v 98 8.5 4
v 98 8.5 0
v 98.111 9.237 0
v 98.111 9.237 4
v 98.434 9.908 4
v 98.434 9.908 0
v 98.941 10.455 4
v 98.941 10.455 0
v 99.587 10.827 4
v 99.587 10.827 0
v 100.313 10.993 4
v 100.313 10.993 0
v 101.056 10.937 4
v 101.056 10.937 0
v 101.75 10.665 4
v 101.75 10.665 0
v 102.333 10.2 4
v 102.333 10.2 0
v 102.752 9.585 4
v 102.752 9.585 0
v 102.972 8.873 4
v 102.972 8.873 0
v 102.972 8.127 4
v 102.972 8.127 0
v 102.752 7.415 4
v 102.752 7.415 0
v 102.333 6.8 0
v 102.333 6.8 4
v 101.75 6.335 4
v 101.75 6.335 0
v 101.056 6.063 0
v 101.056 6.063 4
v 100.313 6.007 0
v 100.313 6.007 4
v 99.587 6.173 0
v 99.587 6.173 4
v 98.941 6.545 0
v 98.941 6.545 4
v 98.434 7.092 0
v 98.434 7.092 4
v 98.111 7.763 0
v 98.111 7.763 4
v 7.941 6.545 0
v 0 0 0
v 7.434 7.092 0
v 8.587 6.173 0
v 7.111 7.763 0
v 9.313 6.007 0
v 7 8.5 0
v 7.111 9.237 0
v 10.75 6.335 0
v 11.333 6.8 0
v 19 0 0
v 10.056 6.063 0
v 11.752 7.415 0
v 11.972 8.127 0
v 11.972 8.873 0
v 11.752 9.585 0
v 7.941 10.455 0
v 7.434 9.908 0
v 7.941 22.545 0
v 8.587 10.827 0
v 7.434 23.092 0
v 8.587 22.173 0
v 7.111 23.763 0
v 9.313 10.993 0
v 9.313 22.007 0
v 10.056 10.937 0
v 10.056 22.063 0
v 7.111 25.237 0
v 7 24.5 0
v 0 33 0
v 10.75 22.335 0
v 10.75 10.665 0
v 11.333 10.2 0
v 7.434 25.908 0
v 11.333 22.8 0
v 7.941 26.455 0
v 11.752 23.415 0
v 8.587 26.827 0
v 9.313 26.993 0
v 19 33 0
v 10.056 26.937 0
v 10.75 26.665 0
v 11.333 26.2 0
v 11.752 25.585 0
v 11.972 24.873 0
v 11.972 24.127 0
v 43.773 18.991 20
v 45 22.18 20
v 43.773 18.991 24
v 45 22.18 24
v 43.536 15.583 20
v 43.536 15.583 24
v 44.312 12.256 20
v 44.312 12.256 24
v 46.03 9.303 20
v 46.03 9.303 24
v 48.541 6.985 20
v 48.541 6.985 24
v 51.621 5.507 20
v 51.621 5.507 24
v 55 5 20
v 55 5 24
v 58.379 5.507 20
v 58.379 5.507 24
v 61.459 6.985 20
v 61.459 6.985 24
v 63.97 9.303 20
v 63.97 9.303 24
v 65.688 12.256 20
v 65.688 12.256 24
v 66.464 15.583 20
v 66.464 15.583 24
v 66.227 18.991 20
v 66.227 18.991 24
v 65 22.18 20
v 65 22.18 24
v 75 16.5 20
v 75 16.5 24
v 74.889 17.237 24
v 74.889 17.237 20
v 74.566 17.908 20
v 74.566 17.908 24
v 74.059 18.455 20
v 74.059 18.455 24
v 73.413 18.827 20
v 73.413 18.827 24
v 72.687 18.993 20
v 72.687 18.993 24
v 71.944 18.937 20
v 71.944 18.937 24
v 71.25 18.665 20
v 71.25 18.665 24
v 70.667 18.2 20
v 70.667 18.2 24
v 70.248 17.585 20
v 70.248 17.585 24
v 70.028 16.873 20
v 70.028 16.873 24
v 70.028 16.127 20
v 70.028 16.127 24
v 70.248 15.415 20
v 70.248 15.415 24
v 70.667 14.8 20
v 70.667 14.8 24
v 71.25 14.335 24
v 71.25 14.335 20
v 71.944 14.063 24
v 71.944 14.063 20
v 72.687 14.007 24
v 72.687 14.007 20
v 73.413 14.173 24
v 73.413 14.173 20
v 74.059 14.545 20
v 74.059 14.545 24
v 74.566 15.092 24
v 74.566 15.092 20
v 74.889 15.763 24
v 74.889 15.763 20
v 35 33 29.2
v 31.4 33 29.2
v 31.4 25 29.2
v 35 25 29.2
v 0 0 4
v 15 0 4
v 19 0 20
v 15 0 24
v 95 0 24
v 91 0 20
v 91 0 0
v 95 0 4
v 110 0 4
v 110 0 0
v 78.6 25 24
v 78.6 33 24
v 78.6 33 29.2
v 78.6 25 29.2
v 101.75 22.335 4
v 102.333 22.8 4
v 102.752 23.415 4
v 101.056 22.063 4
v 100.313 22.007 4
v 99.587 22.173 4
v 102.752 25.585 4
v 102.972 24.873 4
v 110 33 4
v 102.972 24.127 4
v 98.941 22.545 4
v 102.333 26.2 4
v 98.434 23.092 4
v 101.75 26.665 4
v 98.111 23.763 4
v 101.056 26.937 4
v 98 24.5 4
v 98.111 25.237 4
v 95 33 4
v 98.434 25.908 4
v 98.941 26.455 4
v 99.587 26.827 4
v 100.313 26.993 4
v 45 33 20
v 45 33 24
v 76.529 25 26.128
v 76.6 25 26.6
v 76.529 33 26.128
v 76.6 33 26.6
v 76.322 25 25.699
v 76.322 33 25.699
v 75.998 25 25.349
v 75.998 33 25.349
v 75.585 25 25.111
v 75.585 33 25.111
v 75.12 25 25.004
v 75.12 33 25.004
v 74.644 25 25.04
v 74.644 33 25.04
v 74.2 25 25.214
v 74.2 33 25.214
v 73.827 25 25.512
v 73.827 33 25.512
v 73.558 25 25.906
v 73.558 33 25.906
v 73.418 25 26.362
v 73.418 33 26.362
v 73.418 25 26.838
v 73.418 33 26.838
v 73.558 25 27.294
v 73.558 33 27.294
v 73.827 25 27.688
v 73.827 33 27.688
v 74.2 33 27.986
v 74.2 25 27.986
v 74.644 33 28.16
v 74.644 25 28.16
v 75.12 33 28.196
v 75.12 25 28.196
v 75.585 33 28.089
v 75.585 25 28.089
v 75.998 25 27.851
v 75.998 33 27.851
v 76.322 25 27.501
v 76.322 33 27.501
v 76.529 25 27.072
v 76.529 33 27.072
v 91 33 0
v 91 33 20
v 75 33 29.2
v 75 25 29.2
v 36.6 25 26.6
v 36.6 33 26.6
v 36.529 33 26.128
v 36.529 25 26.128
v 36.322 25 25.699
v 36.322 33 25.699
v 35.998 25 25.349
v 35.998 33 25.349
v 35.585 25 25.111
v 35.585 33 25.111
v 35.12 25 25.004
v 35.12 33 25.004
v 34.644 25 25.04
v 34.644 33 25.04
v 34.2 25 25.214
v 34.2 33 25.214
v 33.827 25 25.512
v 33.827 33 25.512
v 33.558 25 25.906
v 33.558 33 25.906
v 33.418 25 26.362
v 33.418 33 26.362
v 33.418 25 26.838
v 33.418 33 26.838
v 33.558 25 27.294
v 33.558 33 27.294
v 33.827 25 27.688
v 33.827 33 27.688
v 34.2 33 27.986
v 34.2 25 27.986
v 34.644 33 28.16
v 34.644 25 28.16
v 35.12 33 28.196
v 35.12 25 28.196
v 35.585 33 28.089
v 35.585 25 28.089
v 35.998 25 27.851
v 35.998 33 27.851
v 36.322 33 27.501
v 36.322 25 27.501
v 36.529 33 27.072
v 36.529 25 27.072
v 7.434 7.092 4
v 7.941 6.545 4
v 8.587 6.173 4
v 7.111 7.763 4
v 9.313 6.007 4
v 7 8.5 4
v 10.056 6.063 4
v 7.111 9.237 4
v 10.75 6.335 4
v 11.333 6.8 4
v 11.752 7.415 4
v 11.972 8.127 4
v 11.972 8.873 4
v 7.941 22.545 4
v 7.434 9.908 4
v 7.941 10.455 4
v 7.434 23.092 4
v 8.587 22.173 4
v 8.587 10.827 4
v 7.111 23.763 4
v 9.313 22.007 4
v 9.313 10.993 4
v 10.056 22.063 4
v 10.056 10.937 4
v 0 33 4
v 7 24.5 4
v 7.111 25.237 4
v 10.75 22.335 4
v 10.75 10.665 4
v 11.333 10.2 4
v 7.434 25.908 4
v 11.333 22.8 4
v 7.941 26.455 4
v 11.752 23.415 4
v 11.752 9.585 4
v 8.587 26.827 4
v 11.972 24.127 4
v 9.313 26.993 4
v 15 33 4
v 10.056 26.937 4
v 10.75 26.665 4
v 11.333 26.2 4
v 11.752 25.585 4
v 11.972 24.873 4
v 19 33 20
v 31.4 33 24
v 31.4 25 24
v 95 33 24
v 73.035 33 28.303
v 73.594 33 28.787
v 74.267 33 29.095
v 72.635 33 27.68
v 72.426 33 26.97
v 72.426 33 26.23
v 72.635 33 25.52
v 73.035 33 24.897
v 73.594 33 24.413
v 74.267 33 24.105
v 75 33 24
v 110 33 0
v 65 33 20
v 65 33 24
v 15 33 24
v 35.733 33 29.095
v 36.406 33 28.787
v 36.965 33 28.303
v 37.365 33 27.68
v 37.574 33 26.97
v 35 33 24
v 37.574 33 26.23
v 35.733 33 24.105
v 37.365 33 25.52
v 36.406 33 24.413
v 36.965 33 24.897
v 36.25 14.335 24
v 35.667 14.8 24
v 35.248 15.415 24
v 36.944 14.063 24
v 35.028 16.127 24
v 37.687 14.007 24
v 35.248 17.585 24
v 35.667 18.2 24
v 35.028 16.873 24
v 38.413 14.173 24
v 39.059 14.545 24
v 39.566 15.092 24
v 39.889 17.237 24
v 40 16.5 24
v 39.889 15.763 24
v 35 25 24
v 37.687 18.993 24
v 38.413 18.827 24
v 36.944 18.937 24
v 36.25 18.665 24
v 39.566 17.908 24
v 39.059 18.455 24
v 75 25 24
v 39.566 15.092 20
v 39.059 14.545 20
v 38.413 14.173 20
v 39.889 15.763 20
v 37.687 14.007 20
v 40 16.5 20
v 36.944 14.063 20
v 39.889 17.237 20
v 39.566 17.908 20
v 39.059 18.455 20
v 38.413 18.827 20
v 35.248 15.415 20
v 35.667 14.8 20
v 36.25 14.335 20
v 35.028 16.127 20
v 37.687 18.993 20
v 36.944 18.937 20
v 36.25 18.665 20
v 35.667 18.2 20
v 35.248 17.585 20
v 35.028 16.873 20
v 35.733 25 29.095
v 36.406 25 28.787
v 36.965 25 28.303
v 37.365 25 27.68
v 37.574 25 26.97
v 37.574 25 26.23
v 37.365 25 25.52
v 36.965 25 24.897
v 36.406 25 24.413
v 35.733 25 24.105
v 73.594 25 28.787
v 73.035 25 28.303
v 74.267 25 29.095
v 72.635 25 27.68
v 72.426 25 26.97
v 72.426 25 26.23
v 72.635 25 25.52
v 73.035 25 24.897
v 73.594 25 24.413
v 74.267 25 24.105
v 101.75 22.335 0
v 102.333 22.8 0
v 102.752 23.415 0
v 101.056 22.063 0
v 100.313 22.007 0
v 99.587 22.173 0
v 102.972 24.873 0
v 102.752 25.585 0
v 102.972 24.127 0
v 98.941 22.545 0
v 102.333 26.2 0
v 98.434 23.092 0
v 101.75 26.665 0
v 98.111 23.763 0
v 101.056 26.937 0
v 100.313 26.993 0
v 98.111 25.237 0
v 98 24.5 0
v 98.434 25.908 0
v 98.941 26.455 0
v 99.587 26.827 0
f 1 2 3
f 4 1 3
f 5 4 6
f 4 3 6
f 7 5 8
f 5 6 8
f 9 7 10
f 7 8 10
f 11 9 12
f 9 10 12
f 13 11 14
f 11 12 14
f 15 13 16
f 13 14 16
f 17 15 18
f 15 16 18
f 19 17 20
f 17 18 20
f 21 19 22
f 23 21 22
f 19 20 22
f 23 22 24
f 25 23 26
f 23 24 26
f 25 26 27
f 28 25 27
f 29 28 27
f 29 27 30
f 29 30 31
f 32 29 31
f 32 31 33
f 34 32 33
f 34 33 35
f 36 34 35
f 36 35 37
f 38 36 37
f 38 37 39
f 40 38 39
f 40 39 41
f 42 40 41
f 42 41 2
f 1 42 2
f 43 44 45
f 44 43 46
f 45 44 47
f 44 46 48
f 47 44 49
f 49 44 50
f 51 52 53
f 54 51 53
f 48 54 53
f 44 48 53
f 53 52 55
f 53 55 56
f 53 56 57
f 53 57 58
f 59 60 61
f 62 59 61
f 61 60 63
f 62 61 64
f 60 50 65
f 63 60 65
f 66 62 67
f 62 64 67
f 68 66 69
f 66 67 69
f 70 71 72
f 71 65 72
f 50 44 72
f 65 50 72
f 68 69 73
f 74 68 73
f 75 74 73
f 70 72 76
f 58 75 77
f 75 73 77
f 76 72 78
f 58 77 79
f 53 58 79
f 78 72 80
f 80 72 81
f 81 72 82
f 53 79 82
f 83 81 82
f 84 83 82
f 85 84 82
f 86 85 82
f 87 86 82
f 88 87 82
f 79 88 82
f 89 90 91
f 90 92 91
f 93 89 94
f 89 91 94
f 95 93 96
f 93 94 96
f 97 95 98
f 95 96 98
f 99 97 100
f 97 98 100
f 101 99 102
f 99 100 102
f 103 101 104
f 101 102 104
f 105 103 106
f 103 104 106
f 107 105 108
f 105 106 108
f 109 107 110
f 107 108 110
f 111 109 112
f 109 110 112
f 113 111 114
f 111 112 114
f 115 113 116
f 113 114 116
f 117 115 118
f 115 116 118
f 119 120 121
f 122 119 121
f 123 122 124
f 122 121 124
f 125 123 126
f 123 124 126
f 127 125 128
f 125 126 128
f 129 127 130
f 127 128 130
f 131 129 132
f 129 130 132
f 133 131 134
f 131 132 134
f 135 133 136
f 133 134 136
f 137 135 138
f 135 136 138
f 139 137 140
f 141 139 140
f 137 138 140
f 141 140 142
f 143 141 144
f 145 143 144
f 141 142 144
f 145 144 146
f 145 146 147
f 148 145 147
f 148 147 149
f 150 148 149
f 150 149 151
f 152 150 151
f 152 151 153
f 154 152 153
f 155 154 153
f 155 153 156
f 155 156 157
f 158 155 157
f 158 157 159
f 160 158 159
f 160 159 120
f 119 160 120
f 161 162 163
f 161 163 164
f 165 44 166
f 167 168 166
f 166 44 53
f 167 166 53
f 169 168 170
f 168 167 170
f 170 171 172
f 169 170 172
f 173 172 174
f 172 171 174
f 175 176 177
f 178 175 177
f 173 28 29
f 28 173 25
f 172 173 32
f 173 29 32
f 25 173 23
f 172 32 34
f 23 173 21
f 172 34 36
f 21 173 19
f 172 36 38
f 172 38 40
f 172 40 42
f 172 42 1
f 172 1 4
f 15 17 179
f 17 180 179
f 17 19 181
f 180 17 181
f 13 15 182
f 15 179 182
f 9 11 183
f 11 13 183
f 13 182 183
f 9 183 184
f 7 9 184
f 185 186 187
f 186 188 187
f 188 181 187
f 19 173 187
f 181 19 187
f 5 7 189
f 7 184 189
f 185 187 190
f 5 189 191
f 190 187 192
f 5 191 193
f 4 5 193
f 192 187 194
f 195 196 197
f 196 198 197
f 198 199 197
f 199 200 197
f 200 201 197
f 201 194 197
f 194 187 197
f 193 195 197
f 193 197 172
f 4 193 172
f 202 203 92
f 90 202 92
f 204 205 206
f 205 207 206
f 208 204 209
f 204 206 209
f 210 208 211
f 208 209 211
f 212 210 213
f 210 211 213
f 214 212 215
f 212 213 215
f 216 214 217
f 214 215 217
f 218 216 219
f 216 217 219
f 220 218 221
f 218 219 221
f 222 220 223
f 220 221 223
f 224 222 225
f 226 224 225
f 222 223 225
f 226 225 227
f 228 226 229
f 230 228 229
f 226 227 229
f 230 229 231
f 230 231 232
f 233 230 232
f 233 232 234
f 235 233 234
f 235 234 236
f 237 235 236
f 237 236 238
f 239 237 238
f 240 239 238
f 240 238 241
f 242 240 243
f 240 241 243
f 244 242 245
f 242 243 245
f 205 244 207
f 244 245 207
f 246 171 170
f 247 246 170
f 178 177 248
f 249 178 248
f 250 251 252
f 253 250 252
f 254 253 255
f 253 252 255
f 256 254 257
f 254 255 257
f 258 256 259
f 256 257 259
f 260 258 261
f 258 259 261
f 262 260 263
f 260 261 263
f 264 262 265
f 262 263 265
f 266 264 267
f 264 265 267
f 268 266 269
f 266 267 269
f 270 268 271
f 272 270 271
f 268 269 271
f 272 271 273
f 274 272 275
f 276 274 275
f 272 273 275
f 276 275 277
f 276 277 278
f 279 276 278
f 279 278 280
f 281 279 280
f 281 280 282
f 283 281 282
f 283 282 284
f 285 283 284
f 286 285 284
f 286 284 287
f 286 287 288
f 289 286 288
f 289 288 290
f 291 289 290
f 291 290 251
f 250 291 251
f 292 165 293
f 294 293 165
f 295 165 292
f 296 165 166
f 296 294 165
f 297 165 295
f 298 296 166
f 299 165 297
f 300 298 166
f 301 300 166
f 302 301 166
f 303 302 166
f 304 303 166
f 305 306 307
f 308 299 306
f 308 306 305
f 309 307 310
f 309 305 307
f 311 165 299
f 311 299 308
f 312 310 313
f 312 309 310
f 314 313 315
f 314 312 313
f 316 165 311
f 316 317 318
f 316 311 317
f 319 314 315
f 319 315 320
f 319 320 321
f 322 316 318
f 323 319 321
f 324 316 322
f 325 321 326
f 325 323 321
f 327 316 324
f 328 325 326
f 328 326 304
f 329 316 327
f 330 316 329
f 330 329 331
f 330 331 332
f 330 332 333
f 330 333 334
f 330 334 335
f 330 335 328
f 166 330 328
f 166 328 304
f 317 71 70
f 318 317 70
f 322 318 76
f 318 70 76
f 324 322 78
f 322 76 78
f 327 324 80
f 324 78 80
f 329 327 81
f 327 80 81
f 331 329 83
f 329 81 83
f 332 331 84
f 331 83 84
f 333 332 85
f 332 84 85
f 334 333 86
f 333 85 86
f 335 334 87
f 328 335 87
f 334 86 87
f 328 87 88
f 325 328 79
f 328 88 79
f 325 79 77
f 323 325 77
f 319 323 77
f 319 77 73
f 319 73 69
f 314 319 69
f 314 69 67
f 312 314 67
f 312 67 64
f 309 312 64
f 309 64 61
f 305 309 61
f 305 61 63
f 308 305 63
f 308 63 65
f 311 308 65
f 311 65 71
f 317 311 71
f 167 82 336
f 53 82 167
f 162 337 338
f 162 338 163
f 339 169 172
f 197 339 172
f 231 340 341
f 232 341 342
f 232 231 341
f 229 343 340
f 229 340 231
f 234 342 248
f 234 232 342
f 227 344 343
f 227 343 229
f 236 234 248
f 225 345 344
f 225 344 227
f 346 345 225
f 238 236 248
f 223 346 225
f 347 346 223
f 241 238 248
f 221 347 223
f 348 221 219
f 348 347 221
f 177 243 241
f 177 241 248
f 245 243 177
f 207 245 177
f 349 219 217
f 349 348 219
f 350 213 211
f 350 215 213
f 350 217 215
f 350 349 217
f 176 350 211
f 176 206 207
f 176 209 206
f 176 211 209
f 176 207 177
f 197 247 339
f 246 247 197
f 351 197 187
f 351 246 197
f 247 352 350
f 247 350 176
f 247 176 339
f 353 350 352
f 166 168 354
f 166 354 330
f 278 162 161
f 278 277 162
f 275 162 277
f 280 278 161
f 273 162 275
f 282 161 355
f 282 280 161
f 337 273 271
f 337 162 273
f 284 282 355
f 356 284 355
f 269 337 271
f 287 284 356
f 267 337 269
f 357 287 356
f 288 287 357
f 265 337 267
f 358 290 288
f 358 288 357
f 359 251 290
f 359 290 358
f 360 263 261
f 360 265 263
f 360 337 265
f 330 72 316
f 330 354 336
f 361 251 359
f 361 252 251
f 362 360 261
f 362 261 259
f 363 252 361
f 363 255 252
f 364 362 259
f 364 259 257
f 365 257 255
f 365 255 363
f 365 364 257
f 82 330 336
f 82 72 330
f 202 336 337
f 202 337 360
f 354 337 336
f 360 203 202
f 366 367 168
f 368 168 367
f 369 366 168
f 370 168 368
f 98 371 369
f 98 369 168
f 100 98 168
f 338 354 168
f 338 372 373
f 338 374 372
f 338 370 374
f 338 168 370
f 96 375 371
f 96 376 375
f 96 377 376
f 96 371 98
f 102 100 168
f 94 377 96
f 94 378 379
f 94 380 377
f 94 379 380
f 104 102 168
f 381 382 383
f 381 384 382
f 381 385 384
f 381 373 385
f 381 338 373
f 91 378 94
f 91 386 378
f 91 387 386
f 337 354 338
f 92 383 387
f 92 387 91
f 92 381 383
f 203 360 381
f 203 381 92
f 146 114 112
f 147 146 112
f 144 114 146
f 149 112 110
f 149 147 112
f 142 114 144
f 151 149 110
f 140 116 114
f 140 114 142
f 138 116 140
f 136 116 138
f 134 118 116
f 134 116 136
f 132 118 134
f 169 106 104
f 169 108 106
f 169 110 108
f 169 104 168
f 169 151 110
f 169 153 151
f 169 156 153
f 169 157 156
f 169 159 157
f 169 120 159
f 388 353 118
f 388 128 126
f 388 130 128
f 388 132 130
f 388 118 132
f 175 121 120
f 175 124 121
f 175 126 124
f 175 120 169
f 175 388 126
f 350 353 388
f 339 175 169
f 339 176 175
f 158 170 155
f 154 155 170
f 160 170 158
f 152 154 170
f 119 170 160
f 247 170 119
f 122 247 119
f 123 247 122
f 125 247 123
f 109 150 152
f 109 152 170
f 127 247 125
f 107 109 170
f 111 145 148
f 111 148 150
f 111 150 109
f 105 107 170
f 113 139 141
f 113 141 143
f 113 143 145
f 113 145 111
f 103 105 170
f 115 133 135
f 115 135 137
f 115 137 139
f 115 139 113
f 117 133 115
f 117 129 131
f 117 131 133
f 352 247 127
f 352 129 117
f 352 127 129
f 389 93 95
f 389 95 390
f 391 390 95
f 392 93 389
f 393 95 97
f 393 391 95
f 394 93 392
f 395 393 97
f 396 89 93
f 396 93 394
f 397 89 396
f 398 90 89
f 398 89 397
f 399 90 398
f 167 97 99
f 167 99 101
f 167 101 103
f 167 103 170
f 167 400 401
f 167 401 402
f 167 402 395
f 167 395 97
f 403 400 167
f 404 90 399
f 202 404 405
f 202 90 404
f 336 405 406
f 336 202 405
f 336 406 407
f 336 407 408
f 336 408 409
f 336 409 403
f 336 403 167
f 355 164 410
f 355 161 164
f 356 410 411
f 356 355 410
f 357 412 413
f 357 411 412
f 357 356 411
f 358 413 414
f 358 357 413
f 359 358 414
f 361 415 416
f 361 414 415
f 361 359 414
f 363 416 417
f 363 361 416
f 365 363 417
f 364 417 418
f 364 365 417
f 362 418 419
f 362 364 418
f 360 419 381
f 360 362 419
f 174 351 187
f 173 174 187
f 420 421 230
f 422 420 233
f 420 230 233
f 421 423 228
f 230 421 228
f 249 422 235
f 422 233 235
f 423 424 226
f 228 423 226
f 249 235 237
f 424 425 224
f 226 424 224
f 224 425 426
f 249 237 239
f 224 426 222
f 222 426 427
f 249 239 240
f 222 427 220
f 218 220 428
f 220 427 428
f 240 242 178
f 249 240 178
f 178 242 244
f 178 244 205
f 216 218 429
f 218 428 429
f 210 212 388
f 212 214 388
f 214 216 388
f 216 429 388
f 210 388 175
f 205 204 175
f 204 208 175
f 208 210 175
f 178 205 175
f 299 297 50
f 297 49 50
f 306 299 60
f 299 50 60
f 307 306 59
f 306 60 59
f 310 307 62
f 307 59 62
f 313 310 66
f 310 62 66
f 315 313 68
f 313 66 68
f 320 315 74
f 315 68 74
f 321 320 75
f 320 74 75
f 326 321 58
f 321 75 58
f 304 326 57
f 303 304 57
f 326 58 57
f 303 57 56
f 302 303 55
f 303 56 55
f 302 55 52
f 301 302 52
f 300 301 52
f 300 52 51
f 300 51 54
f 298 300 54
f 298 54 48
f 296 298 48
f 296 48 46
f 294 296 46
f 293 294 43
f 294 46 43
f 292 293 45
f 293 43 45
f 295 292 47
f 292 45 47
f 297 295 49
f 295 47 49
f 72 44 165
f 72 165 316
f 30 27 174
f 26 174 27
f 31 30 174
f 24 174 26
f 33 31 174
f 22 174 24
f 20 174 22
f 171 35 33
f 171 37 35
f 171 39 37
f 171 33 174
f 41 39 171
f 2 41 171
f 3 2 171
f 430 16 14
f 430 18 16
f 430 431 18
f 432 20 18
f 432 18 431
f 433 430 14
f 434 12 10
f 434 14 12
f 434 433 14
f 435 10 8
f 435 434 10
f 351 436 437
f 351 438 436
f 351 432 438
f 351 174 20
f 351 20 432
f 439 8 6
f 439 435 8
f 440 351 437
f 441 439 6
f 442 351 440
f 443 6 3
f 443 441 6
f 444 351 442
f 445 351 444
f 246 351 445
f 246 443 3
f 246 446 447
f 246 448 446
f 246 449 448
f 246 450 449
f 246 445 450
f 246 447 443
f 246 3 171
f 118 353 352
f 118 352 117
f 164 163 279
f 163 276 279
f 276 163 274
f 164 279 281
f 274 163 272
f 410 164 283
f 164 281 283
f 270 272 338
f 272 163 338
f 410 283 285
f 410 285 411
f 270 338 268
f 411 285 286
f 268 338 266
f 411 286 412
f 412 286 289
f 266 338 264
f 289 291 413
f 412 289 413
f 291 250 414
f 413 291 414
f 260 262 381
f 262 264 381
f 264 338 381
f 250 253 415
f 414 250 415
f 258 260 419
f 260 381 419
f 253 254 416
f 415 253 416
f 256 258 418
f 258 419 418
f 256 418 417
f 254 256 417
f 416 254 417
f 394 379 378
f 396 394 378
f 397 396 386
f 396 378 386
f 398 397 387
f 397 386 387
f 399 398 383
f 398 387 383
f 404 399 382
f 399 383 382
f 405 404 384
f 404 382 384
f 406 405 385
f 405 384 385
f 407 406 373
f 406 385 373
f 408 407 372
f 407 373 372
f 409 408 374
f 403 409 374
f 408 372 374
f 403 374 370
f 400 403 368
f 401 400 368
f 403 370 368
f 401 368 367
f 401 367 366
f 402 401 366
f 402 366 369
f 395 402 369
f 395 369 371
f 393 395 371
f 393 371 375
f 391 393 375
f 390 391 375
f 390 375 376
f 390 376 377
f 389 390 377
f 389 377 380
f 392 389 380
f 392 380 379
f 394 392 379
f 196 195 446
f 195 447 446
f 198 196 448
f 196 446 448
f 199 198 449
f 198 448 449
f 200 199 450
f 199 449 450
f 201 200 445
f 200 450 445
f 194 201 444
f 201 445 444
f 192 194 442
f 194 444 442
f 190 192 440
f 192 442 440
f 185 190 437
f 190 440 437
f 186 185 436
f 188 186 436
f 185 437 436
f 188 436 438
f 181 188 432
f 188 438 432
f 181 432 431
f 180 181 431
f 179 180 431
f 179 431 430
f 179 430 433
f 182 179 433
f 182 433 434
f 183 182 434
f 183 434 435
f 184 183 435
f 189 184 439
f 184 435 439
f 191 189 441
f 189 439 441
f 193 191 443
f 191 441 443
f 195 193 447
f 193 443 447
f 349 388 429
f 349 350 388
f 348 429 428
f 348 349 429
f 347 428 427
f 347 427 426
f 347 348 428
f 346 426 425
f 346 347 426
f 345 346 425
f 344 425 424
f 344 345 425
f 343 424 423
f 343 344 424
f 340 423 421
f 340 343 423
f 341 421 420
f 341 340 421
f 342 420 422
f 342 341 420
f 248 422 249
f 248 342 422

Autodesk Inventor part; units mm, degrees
ref_plane "YZ Plane" through (0, 0, 0) normal (1, 0, 0) x (0, 1, 0)
ref_plane "XZ Plane" through (0, 0, 0) normal (0, 1, 0) x (-1, 0, 0)
ref_plane "XY Plane" through (0, 0, 0) normal (0, 0, 1) x (1, 0, 0)
sketch "Sketch1" plane through (0, 0, 0) normal (0, 0, 1) x (1, 0, 0)
  line L0 (0, 0) -> (0, 33)
  line L1 (0, 33) -> (19, 33)
  line L2 (19, 33) -> (19, 0)
  line L3 (19, 0) -> (0, 0)
  dimension "d0" = 33
  dimension "d1" = 19
extrude "Extrusion1" add sketch "Sketch1" along normal blind 4
sketch "Sketch2" plane through (0, 33, 0) normal (0, 1, 0) x (1, 0, 0)
  line L0 (19, 0) -> (0, 0) projected
  line L1 (19, 0) -> (19, -24)
  line L2 (19, -24) -> (15, -24)
  line L3 (15, -24) -> (15, 0)
  line L4 (15, 0) -> (19, 0)
  dimension "d4" = 24
  dimension "d5" = 4
  dimension "d6" = 24
extrude "Extrusion2" add sketch "Sketch2" against normal blind 33
sketch "Sketch3" plane through (0, 33, 0) normal (0, 1, 0) x (1, 0, 0)
  line L0 (15, -4) -> (15, -24) projected
  line L1 (15, -24) -> (95, -24)
  line L2 (95, -24) -> (95, -20)
  line L3 (95, -20) -> (15, -20)
  line L4 (15, -20) -> (15, -24)
  point P0 (0, 0)
  dimension "d9" = 80
  dimension "d10" = 4
  dimension "d11" = 80
extrude "Extrusion3" add sketch "Sketch3" against normal blind 33
sketch "Sketch4" plane through (0, 33, 0) normal (0, 1, 0) x (1, 0, 0)
  line L0 (15, -24) -> (95, -24) projected
  line L1 (95, -24) -> (95, 0)
  line L2 (95, 0) -> (91, 0)
  line L3 (91, 0) -> (91, -24)
  line L4 (91, -24) -> (95, -24)
  point P0 (0, 0)
  dimension "d14" = 24
  dimension "d15" = 4
  dimension "d16" = 24
extrude "Extrusion4" add sketch "Sketch4" against normal blind 33
sketch "Sketch5" plane through (0, 33, 0) normal (0, 1, 0) x (1, 0, 0)
  line L0 (91, 0) -> (91, -20) projected
  line L1 (91, 0) -> (110, 0)
  line L2 (110, 0) -> (110, -4)
  line L3 (110, -4) -> (91, -4)
  line L4 (91, -4) -> (91, 0)
  point P0 (0, 0)
  dimension "d19" = 19
  dimension "d20" = 4
  dimension "d21" = 19
  dimension "d22" = 4
extrude "Extrusion5" add sketch "Sketch5" against normal blind 33
sketch "Sketch6" plane through (15, 0, 24) normal (0, 0, 1) x (1, 0, 0)
  line L0 (80, 33) -> (80, 0) projected
  line L1 (30, 33) -> (30, 22.18)
  line L2 (50, 33) -> (50, 22.18)
  arc A0 (30.0006, 22.18) -> (49.9994, 22.18) centre (40, 16.5) ccw
  line L3 (30, 22.18) -> (30.0006, 22.18)
  line L4 (49.9994, 22.18) -> (50, 22.18)
  line L5 (30, 33) -> (50, 33)
  line L6 (0, 33) -> (80, 33) projected
  point P0 (-15, 0)
  dimension "d27" = 10.82
  dimension "d28" = 10.82
  dimension "d30" = 23
extrude "Extrusion6" cut sketch "Sketch6" against normal blind 4
sketch "Sketch7" plane through (0, 0, 0) normal (0, 0, -1) x (-1, 0, 0)
  line L0 (0, 33) -> (-19, 33) projected
  line L1 (-19, 0) -> (0, 0) projected
  circle A0 centre (-9.5, 24.5) radius 2.5
  circle A1 centre (-9.5, 8.5) radius 2.5
  dimension "d35" = 5
  dimension "d36" = 5
extrude "Extrusion7" cut sketch "Sketch7" against normal blind 4
sketch "Sketch8" plane through (91, 0, 0) normal (0, 0, -1) x (-1, 0, 0)
  circle A0 centre (-9.5, 24.5) radius 2.5
  circle A1 centre (-9.5, 8.5) radius 2.5
  point P0 (91, 0)
  point P1 (-19, 33)
  point P2 (0, 33)
  point P3 (-19, 0)
  point P4 (0, 0)
  dimension "d39" = 19
  dimension "d43" = 5
  dimension "d44" = 5
extrude "Extrusion8" cut sketch "Sketch8" against normal blind 4
sketch "Sketch9" plane through (15, 0, 24) normal (0, 0, 1) x (1, 0, 0)
  line L0 (0, 33) -> (30, 33) projected
  line L1 (0, 0) -> (0, 33) projected
  circle A0 centre (22.5, 16.5) radius 2.5
  line L2 (50, 33) -> (80, 33) projected
  line L3 (80, 0) -> (80, 33) projected
  circle A1 centre (57.5, 16.5) radius 2.5
  point P0 (-15, 0)
  dimension "d49" = 5
  dimension "d52" = 5
extrude "Extrusion9" cut sketch "Sketch9" against normal blind 4
sketch "Sketch10" plane through (0, 33, 0) normal (0, 1, 0) x (1, 0, 0)
  line L0 (31.4, -24) -> (31.4, -29.2)
  line L1 (31.4, -29.2) -> (35, -29.2)
  line L2 (37.6, -26.6) -> (37.6, -26.6)
  line L3 (40, -24) -> (35, -24) projected
  line L4 (35, -24) -> (31.4, -24)
  arc A0 (37.6, -26.6) -> (35, -24) centre (35, -26.6) ccw
  arc A1 (35, -29.2) -> (37.6, -26.6) centre (35, -26.6) ccw
  circle A2 centre (35, -26.6) radius 1.6
  point P0 (0, 0)
  point P1 (15, -24)
  point P2 (37.6, -29.2)
  point P3 (37.6, -24)
  dimension "d56" = 5.2
  dimension "d57" = 6.2
  dimension "d58" = 5.2
  dimension "d59" = 6.2
  dimension "d60" = 2.6
  dimension "d61" = 3.2
extrude "Extrusion10" add sketch "Sketch10" against normal blind 8
sketch "Sketch11" plane through (91, 33, 20) normal (0, 1, 0) x (1, 0, 0)
  line L0 (-12.4, -4) -> (-12.4, -9.2)
  line L1 (-12.4, -9.2) -> (-16, -9.2)
  line L2 (-18.6, -6.6) -> (-18.6, -6.6)
  line L3 (-16, -4) -> (-21, -4) projected
  line L4 (-16, -4) -> (-12.4, -4)
  arc A0 (-16, -4) -> (-18.6, -6.6) centre (-16, -6.6) ccw
  arc A1 (-18.6, -6.6) -> (-16, -9.2) centre (-16, -6.6) ccw
  circle A2 centre (-16, -6.6) radius 1.6
  point P0 (-91, 20)
  point P1 (4, -4)
  point P2 (-18.6, -9.2)
  point P3 (-18.6, -4)
  dimension "d64" = 16.4
  dimension "d65" = 5.2
  dimension "d66" = 6.2
  dimension "d67" = 5.2
  dimension "d68" = 6.2
  dimension "d69" = 2.6
  dimension "d70" = 3.2
extrude "Extrusion11" add sketch "Sketch11" against normal blind 8
